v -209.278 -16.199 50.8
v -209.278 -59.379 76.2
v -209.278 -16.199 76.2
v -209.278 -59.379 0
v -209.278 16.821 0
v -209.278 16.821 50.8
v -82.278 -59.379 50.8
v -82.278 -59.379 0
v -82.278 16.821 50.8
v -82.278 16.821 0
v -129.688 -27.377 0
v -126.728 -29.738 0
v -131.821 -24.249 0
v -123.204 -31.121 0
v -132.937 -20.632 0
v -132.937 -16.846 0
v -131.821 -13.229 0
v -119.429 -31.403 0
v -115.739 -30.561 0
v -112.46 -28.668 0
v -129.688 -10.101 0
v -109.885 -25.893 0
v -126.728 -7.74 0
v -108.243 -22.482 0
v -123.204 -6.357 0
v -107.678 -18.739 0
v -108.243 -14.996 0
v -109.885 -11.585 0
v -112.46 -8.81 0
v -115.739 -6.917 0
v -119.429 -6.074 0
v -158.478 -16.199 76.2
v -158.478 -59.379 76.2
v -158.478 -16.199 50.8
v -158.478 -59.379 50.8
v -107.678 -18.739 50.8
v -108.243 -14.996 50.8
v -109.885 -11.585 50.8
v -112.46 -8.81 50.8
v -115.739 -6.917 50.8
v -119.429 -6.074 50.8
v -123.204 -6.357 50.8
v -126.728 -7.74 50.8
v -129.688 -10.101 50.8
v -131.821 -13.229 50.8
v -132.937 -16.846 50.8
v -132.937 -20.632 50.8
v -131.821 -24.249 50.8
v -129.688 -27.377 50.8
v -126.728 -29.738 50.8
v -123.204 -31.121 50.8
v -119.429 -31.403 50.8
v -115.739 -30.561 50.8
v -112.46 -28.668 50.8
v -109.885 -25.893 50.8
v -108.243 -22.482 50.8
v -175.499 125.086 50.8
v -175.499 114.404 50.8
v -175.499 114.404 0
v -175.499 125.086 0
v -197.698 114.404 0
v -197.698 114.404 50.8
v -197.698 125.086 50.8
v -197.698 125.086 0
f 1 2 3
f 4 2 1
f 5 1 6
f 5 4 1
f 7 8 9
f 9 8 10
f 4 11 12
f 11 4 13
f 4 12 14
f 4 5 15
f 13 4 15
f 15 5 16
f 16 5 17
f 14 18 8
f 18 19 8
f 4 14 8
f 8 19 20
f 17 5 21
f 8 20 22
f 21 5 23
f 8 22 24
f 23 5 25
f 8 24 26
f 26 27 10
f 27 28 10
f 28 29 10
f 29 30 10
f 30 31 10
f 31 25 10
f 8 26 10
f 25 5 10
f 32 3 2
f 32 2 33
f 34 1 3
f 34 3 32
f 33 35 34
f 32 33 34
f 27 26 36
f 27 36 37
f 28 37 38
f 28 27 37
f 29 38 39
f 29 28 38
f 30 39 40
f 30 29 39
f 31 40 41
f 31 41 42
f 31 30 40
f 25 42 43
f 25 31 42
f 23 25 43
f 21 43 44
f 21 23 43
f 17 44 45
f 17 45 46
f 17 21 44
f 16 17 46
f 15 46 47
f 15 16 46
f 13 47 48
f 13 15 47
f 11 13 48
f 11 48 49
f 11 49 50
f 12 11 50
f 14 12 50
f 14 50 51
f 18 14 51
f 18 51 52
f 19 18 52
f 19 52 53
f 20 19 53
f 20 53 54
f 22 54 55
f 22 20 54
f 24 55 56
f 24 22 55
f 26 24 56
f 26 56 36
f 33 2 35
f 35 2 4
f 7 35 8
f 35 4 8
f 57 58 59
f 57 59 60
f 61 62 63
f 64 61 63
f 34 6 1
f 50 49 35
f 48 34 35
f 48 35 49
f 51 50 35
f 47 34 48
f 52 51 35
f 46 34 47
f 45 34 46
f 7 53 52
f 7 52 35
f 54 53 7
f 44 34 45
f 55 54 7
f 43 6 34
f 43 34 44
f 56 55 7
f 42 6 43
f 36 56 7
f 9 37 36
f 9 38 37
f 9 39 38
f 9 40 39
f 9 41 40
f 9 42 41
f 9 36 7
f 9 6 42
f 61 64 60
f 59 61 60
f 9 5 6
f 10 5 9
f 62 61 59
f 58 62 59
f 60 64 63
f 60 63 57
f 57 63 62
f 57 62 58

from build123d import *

# Parameters (mm, degrees)
F0_W     = 127
F0_H     = 76.2
F0_R     = 12.7
F0_W_2   = 22.198826
F0_H_2   = 10.68192
F1_DEPTH = 50.8
F2_W     = 50.8
F2_H     = 43.18
F3_DEPTH = 25.4


with BuildPart() as f1:
    # F0 (on Top) → F1 (new body)
    with BuildSketch(Plane.XY):
        with Locations((-145.77842, -21.278978)):
            Rectangle(F0_W, F0_H)
        with Locations((-120.37842, -18.738978)):
            Circle(F0_R, mode=Mode.SUBTRACT)
        with Locations((-186.598569, 119.74502)):
            Rectangle(F0_W_2, F0_H_2)
    extrude(amount=F1_DEPTH)

    # F2 (on face) → F3 (join)
    with BuildSketch(Plane.XY.offset(50.8)):
        with Locations((-183.87842, -37.788978)):
            Rectangle(F2_W, F2_H)
    extrude(amount=F3_DEPTH)


solid = f1.part
